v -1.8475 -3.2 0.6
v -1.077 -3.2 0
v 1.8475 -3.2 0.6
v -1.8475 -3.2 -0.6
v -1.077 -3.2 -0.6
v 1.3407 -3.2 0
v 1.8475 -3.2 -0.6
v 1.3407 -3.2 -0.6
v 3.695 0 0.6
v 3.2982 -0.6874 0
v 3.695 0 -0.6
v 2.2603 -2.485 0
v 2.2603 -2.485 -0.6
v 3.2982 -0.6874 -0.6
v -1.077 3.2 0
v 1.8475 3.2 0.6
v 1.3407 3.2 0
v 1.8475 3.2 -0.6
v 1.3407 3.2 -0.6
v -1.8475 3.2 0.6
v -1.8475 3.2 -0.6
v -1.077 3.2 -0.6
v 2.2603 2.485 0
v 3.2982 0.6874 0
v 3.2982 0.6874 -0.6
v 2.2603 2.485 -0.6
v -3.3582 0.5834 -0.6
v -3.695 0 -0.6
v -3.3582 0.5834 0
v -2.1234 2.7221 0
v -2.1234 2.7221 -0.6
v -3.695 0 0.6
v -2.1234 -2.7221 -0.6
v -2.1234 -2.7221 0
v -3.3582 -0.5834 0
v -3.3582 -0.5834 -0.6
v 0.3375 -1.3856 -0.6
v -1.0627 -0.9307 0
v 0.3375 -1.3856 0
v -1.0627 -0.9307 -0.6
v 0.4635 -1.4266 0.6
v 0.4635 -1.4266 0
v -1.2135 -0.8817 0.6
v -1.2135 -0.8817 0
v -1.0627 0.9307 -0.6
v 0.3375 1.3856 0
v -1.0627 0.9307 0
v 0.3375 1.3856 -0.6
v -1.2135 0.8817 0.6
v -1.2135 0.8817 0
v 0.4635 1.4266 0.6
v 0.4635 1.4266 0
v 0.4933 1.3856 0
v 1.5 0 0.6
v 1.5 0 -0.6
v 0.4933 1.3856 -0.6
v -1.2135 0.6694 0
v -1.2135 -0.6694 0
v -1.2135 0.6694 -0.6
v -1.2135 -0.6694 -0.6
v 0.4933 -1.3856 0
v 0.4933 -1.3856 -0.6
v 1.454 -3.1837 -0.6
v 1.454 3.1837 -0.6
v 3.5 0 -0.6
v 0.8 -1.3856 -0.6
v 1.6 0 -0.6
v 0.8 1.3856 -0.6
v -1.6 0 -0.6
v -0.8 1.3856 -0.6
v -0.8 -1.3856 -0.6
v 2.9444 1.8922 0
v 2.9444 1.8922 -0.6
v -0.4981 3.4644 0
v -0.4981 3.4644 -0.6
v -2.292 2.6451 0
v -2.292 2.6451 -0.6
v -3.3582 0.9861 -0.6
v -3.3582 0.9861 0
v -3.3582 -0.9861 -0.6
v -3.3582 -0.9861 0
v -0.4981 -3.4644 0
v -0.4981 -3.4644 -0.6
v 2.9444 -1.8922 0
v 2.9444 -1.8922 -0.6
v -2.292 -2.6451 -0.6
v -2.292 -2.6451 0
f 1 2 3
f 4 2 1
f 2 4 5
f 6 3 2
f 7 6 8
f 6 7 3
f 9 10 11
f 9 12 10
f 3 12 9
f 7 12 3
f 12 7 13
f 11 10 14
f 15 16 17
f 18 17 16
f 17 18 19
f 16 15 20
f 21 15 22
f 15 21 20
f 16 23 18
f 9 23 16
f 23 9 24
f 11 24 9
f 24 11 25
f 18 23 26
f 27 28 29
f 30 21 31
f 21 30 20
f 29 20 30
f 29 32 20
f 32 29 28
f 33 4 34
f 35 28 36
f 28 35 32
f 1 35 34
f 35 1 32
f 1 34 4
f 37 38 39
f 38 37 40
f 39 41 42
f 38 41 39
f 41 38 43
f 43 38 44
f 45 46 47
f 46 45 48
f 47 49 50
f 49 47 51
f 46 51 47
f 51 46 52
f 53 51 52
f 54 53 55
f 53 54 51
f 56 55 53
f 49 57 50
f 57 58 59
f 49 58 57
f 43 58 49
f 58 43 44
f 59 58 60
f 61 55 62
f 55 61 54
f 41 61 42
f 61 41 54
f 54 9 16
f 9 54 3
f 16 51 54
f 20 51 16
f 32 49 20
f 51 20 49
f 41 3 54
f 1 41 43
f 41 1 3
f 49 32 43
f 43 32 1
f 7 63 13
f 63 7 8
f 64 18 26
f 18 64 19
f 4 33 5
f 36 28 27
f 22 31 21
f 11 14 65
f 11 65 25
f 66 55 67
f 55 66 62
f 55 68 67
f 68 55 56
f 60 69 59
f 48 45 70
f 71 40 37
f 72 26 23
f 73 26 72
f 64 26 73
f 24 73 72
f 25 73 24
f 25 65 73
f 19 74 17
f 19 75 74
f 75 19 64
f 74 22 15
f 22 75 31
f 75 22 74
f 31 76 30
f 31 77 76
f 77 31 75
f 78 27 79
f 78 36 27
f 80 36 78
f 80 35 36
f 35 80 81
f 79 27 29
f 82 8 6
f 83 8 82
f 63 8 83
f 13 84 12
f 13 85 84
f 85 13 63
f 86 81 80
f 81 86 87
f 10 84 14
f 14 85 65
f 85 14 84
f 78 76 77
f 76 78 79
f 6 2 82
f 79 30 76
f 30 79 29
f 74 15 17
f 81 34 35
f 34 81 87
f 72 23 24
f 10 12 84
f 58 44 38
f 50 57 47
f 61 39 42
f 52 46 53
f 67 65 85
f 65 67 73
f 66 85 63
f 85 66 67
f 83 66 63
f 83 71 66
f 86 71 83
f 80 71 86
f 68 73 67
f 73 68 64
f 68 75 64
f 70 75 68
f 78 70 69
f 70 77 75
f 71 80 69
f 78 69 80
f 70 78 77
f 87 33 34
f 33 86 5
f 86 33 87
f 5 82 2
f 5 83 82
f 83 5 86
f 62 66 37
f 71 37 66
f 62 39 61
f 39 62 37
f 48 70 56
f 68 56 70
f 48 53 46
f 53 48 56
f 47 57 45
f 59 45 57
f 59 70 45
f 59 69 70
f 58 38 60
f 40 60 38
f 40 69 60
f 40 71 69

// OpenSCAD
// Parameters
thread_nominal_diameter = 3; //[1.5:6:0.1]
across_flats = 6.4; //[3.2:12.8:0.1]
thickness = 2.4; //[1.2:4.8:0.1]
bore_diameter = 3; //[2.5:3.6:0.05]
threaded = 0; //[0:1:1]
thread_representation_scale = 0.9; //[0.75:1:0.01]
chamfer_size = 0.2; //[0.1:0.6:0.05]
overlap = 0.8; //[0.5:2:0.1]
washer_enabled = 1; //[0:1:1]
washer_outer_diameter = 7; //[5:14:0.1]
washer_thickness = 0.6; //[0.3:1.5:0.05]
washer_inner_diameter = 3.2; //[3:4:0.05]

// Connectivity helper (force 1–2mm intersection between parts)
connect_overlap = 1.2; // mm (meets requirement 1–2mm)

// Derived
hex_R = across_flats/(2*cos(30));
bore_R = (bore_diameter*(1-threaded) + bore_diameter*thread_representation_scale*threaded)/2;

// Nut and Washer - complete geometry (single connected solid)
module nut_and_washer() {

  union() {

    // --- Main nut body (with bore + chamfers) ---
    color("DimGray")
    difference() {
      cylinder(r=hex_R, h=thickness, center=true, $fn=6);

      // Central bore
      cylinder(r=bore_R, h=thickness + 2*overlap, center=true);

      // Top chamfer cut
      translate([0, 0, thickness/2 - (chamfer_size + overlap)/2])
        cylinder(r=hex_R + chamfer_size, h=chamfer_size + overlap, center=true);

      // Bottom chamfer cut
      translate([0, 0, -thickness/2 + (chamfer_size + overlap)/2])
        cylinder(r=hex_R + chamfer_size, h=chamfer_size + overlap, center=true);
    }

    // --- Add missing/implicit thin plates (top & bottom) and ATTACH them ---
    // These plates are created and overlapped into the nut by connect_overlap.
    // Keep them thin so the design remains essentially a nut, but ensure no floating parts.
    plate_thickness = 0.6; // thin strip/plate thickness (matches typical "thin plate" look)
    plate_R = hex_R;       // same footprint as nut so it doesn't change silhouette

    // Top plate: intersects nut by connect_overlap
    color("DimGray")
    translate([0, 0, thickness/2 + plate_thickness/2 - connect_overlap])
      difference() {
        cylinder(r=plate_R, h=plate_thickness, center=true, $fn=6);
        cylinder(r=bore_R, h=plate_thickness + 2*overlap, center=true);
      }

    // Bottom plate: intersects nut by connect_overlap
    color("DimGray")
    translate([0, 0, -thickness/2 - plate_thickness/2 + connect_overlap])
      difference() {
        cylinder(r=plate_R, h=plate_thickness, center=true, $fn=6);
        cylinder(r=bore_R, h=plate_thickness + 2*overlap, center=true);
      }

    // --- Washer (attached with guaranteed overlap) ---
    if (washer_enabled) {
      // Place washer under nut and overlap into the nut by connect_overlap
      washer_z = -thickness/2 - washer_thickness/2 + connect_overlap;

      color("Silver")
      difference() {
        translate([0, 0, washer_z])
          cylinder(r=washer_outer_diameter/2, h=washer_thickness, center=true);

        translate([0, 0, washer_z])
          cylinder(r=washer_inner_diameter/2, h=washer_thickness + 2*overlap, center=true);
      }
    }
  }
}

// Assembly
module assembly() {
  nut_and_washer();
}

assembly();
